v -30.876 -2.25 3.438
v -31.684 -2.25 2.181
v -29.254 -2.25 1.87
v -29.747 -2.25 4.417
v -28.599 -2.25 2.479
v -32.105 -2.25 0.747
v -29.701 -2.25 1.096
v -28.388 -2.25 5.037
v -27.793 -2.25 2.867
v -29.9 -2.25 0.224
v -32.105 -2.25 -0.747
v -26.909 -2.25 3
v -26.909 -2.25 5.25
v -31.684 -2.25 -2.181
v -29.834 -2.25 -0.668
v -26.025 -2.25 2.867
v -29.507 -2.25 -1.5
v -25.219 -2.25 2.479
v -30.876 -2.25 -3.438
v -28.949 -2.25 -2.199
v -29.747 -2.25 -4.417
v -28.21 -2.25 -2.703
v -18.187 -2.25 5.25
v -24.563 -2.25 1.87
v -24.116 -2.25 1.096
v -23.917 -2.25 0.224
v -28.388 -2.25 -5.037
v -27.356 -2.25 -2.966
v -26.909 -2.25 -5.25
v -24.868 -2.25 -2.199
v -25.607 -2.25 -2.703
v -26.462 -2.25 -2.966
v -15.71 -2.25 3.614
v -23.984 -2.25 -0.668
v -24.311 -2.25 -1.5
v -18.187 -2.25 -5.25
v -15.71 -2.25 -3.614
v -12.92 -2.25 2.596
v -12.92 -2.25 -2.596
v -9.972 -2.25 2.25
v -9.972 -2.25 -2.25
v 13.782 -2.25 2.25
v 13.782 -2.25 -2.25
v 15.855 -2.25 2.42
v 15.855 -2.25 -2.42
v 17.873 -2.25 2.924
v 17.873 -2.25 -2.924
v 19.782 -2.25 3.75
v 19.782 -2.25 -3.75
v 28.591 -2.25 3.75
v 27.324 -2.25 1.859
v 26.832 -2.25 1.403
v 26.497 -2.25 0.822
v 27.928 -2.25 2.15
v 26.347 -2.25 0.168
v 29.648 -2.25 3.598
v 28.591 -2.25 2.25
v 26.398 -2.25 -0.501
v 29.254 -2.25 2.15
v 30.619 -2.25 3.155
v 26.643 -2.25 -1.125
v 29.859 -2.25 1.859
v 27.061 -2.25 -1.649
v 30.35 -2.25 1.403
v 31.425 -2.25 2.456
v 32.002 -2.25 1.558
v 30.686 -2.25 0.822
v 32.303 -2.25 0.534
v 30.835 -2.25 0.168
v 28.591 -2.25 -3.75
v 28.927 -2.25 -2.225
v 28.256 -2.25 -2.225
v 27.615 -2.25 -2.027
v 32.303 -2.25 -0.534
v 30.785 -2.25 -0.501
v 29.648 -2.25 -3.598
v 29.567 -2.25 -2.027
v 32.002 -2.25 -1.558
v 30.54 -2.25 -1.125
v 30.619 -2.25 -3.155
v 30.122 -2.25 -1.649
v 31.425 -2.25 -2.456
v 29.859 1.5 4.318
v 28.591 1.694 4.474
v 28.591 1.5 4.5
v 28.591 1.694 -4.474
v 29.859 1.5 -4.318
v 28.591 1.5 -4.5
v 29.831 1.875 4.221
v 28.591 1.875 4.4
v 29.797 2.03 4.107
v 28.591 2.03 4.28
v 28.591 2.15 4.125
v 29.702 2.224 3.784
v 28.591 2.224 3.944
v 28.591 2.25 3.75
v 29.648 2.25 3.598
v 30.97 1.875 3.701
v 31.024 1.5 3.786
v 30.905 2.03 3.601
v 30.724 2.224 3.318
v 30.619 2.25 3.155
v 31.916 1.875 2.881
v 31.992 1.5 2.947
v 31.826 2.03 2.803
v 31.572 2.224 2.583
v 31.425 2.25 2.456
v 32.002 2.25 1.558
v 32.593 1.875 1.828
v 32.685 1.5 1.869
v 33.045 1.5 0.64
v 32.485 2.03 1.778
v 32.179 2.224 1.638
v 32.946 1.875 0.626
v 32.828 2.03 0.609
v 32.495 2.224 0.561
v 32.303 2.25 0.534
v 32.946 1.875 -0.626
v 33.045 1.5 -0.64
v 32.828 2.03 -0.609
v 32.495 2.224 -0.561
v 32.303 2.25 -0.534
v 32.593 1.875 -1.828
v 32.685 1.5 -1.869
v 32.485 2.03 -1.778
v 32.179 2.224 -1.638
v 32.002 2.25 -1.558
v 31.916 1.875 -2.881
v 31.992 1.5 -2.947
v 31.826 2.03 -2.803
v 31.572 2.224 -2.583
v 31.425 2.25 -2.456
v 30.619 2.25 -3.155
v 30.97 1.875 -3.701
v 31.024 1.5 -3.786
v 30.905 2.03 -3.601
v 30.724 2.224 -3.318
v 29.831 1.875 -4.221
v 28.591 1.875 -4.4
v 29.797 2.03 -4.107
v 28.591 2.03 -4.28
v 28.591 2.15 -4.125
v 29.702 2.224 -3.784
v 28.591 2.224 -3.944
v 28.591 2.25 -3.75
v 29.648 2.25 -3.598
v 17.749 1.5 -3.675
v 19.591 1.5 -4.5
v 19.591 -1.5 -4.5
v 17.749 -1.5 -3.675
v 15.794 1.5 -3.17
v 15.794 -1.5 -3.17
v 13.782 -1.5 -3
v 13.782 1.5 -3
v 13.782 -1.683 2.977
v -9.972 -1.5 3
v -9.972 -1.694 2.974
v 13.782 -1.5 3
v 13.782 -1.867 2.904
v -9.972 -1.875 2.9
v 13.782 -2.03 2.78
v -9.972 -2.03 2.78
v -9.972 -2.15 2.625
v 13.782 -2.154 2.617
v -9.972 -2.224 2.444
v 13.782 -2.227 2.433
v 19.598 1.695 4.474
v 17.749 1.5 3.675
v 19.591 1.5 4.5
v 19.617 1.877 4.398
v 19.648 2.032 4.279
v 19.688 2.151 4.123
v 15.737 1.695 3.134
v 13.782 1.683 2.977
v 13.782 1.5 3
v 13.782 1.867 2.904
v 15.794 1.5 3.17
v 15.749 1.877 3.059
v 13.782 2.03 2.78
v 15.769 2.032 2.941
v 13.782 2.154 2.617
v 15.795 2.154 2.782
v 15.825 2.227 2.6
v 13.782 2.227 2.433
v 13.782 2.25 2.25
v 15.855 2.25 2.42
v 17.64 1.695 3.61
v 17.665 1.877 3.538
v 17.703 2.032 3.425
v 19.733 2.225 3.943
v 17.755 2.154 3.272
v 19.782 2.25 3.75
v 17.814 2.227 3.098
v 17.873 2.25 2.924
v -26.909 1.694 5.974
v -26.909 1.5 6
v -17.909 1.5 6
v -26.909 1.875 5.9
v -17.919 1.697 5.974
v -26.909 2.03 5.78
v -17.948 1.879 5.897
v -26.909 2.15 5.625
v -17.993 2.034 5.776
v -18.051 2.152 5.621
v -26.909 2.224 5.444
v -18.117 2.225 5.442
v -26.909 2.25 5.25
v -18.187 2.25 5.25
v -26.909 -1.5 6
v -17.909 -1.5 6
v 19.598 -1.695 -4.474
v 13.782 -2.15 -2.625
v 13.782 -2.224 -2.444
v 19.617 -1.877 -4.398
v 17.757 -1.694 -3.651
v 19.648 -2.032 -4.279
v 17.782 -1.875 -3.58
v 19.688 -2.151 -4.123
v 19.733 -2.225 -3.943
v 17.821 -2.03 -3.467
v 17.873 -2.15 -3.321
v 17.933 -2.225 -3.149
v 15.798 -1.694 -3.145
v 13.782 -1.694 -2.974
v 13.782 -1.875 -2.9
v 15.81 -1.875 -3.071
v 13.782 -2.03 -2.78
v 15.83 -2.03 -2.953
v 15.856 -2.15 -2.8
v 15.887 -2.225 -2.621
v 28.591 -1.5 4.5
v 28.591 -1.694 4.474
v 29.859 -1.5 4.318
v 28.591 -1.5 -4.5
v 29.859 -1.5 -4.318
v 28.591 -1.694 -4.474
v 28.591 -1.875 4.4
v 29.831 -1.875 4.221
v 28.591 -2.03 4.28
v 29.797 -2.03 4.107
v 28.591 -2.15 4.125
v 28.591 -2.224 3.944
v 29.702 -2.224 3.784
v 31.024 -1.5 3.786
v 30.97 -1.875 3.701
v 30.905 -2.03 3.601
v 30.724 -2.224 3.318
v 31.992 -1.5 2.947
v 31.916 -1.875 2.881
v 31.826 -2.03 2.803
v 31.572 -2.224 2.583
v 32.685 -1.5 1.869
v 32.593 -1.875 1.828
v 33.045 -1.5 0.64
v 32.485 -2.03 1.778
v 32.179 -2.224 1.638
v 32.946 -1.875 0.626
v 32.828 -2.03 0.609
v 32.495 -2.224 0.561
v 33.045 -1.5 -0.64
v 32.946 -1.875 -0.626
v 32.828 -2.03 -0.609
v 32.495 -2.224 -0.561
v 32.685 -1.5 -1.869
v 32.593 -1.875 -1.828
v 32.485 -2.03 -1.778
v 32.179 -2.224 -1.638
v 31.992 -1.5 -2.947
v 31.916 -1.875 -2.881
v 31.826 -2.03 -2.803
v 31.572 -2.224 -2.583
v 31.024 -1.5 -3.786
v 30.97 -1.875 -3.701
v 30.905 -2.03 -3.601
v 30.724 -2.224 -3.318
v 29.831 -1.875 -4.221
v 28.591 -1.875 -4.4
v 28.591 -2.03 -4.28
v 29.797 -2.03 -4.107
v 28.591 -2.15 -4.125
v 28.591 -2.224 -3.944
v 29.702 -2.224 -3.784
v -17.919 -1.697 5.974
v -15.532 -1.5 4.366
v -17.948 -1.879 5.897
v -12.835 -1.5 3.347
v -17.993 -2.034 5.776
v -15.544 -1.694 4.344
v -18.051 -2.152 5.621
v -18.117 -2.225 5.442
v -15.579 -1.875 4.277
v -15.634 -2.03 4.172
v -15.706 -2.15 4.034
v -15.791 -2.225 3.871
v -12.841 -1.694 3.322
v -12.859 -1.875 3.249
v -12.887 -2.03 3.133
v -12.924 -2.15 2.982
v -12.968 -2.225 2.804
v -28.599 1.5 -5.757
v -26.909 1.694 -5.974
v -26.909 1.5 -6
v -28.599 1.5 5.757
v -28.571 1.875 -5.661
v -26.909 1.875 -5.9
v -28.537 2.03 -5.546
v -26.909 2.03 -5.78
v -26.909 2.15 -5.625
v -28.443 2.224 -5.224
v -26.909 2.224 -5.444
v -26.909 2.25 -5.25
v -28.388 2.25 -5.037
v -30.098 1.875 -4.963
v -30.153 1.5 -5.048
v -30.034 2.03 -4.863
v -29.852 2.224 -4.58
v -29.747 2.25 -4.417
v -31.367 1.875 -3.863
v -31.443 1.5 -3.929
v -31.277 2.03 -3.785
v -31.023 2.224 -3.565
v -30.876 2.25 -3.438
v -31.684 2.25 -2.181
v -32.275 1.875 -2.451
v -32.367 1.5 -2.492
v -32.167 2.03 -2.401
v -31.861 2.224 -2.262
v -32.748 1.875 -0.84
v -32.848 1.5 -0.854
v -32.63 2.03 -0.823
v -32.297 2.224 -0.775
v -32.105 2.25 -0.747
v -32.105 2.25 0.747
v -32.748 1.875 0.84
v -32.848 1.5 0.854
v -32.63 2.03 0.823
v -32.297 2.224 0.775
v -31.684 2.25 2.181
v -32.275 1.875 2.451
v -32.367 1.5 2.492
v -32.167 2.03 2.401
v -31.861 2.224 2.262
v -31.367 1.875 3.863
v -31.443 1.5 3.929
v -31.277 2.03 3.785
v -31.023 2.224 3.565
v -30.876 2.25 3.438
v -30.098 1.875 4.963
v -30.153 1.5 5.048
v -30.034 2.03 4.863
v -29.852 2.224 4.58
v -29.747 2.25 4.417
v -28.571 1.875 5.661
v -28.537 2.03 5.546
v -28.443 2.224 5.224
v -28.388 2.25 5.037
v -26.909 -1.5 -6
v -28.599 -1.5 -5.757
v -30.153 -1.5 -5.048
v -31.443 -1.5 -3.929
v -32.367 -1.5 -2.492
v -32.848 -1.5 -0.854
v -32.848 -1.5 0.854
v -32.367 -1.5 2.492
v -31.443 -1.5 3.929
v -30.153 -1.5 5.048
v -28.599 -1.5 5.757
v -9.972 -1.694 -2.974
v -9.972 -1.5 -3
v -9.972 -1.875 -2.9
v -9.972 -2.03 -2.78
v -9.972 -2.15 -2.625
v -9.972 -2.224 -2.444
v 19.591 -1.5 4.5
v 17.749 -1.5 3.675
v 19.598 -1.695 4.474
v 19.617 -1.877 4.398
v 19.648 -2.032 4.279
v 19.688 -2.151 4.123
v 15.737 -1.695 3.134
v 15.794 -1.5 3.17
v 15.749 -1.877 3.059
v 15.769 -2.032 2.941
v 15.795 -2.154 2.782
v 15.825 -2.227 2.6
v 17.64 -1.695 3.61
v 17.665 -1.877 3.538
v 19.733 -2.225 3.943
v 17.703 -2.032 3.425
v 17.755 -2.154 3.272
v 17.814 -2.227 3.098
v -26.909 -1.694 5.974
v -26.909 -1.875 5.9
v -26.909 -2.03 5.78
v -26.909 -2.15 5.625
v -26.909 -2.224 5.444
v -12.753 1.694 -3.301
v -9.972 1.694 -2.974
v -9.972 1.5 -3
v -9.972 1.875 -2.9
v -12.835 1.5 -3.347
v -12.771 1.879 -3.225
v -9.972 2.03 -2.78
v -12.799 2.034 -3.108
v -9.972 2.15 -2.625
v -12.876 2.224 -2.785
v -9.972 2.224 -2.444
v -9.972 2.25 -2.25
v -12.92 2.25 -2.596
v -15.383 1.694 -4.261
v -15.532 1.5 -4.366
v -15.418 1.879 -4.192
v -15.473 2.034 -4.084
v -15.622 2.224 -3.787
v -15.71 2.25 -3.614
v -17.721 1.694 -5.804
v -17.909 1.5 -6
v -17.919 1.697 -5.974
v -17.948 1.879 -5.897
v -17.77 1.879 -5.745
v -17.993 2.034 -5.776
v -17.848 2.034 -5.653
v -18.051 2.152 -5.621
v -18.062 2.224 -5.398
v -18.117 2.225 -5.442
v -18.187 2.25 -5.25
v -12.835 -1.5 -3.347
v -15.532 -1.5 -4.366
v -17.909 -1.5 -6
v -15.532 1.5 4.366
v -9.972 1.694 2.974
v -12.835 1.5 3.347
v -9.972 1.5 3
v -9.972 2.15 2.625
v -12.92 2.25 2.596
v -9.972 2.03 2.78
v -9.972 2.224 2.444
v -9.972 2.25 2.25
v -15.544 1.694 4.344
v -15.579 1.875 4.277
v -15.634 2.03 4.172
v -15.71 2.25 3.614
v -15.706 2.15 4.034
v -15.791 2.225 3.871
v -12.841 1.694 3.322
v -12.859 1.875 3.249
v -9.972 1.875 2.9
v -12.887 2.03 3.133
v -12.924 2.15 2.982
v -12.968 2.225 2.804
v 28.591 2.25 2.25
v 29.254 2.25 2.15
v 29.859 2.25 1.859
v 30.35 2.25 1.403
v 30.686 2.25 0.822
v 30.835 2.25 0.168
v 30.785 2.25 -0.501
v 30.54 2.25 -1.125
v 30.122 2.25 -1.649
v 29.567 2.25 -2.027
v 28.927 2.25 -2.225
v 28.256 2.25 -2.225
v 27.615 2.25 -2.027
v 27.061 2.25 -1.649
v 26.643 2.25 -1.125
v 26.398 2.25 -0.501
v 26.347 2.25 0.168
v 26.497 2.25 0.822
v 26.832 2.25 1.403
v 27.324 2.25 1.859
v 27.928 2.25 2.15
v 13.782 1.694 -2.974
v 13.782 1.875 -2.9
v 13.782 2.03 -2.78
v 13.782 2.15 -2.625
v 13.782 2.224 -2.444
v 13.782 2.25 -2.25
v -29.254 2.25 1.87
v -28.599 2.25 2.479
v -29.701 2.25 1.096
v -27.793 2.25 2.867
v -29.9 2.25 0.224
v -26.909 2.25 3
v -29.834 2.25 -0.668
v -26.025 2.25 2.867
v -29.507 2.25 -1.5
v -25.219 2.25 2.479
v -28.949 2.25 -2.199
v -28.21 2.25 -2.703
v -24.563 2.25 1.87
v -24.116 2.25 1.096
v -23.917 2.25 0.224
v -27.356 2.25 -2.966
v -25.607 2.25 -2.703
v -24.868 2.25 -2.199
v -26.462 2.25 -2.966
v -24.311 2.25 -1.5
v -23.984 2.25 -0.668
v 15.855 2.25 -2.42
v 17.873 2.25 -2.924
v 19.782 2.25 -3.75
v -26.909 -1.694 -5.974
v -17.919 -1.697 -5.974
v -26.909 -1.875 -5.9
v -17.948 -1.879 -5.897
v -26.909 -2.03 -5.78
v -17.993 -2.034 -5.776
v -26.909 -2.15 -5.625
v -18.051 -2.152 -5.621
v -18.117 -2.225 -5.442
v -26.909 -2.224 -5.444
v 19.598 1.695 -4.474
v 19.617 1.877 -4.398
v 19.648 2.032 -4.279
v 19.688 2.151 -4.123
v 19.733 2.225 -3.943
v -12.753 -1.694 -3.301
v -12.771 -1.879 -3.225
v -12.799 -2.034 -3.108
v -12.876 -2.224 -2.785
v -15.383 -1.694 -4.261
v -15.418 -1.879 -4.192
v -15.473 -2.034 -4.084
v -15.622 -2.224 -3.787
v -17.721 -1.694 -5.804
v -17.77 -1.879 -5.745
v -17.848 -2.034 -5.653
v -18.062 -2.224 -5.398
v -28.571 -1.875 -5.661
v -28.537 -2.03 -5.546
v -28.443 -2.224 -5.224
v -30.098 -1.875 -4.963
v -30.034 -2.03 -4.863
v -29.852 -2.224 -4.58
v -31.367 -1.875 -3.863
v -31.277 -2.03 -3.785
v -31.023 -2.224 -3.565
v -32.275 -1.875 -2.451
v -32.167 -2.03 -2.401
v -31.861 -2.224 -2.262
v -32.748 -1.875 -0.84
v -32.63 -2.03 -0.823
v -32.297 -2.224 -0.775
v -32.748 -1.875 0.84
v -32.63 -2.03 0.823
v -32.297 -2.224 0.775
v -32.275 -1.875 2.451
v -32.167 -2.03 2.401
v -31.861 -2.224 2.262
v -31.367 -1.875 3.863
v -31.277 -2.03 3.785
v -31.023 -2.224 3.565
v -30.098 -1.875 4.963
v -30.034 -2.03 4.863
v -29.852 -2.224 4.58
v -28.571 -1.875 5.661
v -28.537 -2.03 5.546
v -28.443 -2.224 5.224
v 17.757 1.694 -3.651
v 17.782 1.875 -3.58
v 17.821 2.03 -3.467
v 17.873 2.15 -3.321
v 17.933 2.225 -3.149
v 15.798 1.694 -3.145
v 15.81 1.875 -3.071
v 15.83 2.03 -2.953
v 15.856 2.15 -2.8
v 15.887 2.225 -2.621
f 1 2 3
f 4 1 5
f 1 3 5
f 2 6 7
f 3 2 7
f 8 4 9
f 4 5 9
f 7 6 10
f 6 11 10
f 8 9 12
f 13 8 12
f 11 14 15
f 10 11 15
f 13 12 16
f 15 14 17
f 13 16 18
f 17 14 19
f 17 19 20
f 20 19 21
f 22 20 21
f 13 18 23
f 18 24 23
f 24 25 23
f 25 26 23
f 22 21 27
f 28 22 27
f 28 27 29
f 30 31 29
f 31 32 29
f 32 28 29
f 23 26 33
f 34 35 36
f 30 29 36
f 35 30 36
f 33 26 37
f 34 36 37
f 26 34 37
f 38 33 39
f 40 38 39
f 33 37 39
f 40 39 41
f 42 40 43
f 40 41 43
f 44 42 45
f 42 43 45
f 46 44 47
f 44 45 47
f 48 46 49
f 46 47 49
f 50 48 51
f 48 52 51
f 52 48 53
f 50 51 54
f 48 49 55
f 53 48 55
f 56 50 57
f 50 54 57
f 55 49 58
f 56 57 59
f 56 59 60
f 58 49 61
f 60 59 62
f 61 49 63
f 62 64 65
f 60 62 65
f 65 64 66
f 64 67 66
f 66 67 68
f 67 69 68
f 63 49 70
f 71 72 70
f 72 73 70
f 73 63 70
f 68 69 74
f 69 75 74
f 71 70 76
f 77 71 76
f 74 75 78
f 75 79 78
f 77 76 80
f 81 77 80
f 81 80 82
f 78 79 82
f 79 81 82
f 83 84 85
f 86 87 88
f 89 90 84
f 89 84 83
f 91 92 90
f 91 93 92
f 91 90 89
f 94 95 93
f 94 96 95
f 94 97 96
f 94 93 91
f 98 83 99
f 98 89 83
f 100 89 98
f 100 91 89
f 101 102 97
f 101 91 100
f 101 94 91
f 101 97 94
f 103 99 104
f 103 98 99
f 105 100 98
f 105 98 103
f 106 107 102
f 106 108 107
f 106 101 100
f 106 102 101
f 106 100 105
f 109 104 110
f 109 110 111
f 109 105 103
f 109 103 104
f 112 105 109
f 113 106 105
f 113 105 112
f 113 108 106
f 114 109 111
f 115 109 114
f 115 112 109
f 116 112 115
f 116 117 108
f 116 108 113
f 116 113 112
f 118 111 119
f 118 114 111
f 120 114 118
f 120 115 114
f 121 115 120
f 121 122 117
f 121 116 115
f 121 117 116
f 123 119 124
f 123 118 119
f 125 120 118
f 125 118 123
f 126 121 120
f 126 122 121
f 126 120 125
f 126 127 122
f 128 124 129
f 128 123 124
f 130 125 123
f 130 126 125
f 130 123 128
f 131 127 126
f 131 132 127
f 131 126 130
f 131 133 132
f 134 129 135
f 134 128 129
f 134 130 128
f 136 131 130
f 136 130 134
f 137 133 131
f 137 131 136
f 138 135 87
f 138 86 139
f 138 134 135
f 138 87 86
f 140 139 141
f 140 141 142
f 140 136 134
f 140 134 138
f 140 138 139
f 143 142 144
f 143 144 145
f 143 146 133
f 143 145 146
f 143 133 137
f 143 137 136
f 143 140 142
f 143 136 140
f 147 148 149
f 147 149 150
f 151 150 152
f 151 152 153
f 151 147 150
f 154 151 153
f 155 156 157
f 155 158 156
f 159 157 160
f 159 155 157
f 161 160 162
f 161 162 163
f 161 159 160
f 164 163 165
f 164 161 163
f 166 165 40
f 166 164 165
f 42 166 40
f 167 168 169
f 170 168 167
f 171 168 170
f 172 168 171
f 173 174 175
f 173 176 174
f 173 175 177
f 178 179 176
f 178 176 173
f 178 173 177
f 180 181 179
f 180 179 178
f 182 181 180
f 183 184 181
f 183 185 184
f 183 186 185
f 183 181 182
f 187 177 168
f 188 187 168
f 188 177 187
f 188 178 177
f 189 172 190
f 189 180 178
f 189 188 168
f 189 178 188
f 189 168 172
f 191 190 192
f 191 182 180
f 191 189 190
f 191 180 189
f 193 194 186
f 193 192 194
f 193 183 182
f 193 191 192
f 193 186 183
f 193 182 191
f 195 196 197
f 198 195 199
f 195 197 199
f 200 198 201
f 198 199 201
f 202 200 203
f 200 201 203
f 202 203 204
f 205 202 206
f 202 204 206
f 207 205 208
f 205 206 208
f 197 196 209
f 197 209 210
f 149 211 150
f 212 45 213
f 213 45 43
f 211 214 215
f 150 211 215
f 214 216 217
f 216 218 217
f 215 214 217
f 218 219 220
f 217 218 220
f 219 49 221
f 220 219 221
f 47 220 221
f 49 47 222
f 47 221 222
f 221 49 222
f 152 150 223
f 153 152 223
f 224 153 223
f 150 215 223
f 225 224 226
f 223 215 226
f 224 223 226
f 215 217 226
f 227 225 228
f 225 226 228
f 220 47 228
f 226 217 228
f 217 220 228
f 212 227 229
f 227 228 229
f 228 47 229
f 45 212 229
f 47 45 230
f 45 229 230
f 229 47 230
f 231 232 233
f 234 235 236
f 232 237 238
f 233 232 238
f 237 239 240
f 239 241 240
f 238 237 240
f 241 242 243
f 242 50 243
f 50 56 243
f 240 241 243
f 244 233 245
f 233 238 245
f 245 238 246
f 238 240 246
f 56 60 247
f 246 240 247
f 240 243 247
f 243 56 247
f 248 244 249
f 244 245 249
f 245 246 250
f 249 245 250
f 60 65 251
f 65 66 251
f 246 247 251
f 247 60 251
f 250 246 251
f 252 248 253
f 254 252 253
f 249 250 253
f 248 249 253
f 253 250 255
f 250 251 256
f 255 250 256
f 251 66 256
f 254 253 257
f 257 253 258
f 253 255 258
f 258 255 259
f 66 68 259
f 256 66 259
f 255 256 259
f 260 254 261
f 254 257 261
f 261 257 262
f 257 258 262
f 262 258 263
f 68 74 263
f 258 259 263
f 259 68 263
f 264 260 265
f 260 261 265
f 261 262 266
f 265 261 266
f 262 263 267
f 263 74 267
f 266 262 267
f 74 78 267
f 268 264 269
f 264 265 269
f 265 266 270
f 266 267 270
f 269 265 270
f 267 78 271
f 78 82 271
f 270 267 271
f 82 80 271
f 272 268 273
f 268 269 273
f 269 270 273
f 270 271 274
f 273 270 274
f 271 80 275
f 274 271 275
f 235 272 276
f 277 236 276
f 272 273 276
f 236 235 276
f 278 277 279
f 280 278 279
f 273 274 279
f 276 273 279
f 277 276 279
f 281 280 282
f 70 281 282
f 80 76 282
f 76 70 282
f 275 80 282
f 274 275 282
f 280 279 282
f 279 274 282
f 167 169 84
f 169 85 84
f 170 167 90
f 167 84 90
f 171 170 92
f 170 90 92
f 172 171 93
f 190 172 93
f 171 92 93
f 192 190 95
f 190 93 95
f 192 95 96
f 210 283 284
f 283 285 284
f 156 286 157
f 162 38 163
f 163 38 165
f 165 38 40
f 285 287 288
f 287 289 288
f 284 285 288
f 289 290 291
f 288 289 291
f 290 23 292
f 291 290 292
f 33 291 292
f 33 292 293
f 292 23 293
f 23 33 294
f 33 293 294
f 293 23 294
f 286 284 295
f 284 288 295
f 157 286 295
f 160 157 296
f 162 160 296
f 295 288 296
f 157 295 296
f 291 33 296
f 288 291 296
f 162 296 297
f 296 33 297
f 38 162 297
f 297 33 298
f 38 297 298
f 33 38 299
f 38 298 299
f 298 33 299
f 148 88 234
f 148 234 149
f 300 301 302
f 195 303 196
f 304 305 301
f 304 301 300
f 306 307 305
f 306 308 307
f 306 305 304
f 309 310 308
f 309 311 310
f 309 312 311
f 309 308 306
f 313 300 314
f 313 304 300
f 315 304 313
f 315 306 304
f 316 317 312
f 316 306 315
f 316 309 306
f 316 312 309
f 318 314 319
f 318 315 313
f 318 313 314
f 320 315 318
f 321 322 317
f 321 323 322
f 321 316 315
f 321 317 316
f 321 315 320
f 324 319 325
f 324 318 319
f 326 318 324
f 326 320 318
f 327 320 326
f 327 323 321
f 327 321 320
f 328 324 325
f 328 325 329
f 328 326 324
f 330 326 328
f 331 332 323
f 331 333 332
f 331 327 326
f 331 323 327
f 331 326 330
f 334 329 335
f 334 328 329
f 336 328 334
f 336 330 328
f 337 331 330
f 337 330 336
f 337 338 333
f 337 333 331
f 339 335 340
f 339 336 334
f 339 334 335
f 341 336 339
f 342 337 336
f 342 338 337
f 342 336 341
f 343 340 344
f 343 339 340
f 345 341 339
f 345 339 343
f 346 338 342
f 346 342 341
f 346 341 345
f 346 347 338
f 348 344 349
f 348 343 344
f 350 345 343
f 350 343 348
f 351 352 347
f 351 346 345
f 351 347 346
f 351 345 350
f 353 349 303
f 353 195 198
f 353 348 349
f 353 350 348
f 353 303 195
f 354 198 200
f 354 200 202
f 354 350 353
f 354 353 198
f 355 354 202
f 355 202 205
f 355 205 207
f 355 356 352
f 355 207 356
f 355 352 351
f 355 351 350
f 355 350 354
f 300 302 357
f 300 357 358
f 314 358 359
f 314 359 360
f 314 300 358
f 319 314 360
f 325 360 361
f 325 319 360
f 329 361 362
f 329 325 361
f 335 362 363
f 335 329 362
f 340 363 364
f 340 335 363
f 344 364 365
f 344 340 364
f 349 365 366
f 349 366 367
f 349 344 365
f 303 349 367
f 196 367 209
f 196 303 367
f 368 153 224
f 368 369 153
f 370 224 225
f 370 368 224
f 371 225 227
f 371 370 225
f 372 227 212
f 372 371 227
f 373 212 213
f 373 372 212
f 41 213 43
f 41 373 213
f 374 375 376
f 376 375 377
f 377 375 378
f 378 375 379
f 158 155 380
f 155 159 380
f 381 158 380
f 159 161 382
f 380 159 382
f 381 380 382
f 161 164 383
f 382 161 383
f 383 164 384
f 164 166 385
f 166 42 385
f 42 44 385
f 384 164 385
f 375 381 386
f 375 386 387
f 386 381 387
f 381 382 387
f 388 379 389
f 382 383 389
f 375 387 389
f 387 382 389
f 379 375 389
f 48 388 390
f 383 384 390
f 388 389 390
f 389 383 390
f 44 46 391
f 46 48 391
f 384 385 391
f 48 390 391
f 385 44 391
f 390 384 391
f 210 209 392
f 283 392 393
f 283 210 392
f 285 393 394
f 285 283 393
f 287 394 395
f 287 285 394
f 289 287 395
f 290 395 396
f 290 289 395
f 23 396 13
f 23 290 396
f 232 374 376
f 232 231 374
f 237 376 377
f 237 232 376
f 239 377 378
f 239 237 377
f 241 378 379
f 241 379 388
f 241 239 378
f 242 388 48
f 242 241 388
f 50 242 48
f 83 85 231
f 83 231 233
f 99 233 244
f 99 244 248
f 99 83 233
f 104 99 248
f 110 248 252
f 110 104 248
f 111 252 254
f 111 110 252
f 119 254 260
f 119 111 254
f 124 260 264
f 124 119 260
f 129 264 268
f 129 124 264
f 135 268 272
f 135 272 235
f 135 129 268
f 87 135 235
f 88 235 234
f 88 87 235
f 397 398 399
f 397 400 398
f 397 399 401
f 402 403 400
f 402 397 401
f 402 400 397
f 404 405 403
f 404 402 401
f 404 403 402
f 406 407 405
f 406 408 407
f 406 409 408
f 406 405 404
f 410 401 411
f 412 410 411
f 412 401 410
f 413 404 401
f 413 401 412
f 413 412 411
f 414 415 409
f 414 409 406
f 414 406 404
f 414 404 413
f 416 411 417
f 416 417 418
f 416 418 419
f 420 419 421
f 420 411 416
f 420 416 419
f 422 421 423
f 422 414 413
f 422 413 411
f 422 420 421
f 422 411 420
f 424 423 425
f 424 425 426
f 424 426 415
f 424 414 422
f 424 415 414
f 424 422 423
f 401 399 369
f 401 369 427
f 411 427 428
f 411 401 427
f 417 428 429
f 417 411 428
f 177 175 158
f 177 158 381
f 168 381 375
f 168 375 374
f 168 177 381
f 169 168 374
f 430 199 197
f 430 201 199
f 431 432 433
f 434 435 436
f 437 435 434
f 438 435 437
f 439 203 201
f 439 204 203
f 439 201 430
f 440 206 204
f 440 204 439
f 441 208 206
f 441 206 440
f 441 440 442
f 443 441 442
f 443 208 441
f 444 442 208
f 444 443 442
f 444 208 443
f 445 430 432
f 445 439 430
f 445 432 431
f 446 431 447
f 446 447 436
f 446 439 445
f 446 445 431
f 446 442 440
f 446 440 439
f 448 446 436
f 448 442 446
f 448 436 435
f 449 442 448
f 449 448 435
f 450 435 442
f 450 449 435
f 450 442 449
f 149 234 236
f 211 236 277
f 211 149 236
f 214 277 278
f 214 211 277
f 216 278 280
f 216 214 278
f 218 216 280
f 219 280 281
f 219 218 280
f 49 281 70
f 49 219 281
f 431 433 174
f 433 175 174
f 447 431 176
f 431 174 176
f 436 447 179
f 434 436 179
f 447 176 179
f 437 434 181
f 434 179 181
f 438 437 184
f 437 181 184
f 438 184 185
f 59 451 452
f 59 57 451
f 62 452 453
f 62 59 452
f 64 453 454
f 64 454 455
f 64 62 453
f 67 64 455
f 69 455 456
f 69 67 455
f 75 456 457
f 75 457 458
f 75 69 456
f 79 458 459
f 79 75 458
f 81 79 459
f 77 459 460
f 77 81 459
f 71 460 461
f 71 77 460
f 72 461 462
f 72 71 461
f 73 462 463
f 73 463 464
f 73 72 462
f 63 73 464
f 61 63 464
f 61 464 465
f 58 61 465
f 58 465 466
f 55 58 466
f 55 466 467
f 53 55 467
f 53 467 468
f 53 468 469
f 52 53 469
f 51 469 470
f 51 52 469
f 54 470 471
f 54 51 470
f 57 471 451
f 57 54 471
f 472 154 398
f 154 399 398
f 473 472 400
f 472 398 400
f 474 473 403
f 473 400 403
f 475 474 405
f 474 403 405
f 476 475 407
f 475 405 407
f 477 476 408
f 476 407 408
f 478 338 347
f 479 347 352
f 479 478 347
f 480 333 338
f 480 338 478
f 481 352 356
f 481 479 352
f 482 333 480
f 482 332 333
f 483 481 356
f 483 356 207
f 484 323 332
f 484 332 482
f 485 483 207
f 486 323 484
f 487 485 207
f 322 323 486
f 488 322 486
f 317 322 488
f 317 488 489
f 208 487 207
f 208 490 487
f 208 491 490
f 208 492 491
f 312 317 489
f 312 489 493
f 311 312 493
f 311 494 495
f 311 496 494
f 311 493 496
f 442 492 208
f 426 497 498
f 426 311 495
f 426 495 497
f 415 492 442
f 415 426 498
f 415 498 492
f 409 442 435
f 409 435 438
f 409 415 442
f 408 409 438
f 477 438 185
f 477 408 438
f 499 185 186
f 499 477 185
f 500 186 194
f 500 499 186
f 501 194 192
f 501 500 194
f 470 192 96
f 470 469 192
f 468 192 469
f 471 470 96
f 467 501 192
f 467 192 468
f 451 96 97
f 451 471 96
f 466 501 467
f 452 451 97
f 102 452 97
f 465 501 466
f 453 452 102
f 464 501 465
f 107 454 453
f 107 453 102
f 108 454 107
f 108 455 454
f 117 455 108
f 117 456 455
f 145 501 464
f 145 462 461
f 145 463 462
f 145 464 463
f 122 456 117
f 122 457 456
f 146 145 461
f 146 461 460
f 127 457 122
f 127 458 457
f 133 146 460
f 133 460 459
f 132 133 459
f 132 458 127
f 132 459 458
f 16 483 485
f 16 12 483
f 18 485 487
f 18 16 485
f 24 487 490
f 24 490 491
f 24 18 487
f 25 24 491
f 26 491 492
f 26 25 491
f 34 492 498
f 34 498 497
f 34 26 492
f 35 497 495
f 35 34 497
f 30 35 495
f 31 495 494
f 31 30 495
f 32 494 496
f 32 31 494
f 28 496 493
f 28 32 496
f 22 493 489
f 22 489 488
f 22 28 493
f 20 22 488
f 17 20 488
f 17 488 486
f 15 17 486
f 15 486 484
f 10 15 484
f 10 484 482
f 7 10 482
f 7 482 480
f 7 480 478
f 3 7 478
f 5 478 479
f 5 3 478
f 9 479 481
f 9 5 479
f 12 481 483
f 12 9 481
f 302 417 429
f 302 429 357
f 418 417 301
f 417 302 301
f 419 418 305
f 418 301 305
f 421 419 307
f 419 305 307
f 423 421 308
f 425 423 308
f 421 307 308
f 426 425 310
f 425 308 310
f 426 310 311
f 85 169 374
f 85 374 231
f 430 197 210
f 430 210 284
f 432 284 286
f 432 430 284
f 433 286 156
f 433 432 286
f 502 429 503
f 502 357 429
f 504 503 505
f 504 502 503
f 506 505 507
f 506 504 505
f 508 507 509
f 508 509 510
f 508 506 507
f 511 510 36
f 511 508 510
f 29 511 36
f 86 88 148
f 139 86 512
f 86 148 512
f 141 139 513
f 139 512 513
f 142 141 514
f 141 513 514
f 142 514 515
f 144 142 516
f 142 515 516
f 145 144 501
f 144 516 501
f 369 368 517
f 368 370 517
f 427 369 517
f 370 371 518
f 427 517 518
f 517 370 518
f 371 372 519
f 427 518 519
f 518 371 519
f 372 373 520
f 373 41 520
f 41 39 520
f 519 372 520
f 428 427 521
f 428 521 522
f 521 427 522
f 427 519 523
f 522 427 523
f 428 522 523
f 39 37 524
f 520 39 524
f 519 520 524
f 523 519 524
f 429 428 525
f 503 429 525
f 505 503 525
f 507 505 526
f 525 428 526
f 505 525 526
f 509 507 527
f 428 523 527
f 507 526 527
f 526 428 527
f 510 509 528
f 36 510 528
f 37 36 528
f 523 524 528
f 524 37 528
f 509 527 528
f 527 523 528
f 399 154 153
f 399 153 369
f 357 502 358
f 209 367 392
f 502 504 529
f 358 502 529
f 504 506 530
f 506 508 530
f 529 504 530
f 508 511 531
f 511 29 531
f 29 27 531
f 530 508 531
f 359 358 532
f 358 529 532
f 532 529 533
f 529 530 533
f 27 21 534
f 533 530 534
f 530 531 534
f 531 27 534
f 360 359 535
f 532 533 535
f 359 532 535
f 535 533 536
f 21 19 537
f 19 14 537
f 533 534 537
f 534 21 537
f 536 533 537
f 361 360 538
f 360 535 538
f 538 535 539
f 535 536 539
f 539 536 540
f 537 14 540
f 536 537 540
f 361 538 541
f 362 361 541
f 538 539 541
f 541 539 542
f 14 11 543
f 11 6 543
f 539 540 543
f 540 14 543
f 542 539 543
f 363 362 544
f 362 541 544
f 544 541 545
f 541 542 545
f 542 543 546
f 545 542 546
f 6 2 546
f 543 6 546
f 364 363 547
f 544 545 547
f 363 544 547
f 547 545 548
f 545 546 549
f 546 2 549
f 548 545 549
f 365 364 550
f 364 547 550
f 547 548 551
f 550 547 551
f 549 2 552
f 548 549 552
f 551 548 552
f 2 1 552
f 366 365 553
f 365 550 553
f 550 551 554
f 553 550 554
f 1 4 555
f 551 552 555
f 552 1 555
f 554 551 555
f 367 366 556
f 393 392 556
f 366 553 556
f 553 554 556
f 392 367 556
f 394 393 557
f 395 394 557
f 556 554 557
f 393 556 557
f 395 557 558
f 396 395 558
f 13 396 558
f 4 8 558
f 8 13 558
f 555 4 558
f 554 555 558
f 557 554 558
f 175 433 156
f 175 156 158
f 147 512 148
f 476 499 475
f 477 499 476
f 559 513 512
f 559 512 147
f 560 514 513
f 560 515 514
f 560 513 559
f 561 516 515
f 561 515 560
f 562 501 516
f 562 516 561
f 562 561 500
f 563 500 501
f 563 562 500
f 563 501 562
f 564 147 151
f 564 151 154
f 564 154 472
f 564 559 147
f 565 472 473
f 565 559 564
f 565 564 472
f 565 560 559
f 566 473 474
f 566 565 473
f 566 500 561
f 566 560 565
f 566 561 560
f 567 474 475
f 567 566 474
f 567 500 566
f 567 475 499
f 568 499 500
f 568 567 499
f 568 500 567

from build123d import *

# Parameters (mm, degrees)
SKETCH1_R           = 2
SKETCH1_R_2         = 1.5
BOSS_EXTRUDE1_DEPTH = 1.5
SCALE1_SCALE        = 1.5
FILLET1_R           = 0.75


with BuildPart() as part:
    # Sketch1 → Boss-Extrude1 (new, symmetric)
    with BuildSketch(Plane(origin=(0, 0, 0), x_dir=(1, 0, 0), z_dir=(0, 1, 0))):
        with BuildLine():
            ThreePointArc((-18.5, 4), (-22.5, 0), (-18.5, -4))
            Line((-18.5, -4), (-12.5, -4))
            ThreePointArc((-12.5, -4), (-10.036924503, -2.516685226), (-7.208497378, -2))
            Line((-7.208497378, -2), (8.627016654, -2))
            ThreePointArc((8.627016654, -2), (10.627016654, -2.254033308), (12.5, -3))
            Line((12.5, -3), (18.5, -3))
            ThreePointArc((18.5, -3), (21.5, 0), (18.5, 3))
            Line((18.5, 3), (12.5, 3))
            ThreePointArc((12.5, 3), (10.627016654, 2.254033308), (8.627016654, 2))
            Line((8.627016654, 2), (-7.208497378, 2))
            ThreePointArc((-7.208497378, 2), (-10.036924503, 2.516685226), (-12.5, 4))
            Line((-12.5, 4), (-18.5, 4))
        make_face()
        with Locations(Location((-18.5, 0, 0), (0, 0, 270))):
            Circle(SKETCH1_R, mode=Mode.SUBTRACT)
        with Locations(Location((18.5, 0, 0), (0, 0, 270))):
            Circle(SKETCH1_R_2, mode=Mode.SUBTRACT)
    extrude(amount=BOSS_EXTRUDE1_DEPTH, both=True)


with BuildPart() as part_1:
    # Scale1: scaled about (-1.682409561, 0, 0)
    add(part.part.scale(SCALE1_SCALE).moved(Location((0.841204781, 0, 0))))

    # Fillet1
    fillet1_edges = [part_1.edges().sort_by_distance(p)[0] for p in [
        (33.09120478, 2.25, 0),
        (24.091204781, 2.25, -4.5),
        (16.781729761, -2.25, 3.381049961),
        (1.905094237, -2.25, 3),
        (-14.214181973, -2.25, 3.77502784),
        (-22.408795219, -2.25, 6),
        (-32.908795219, -2.25, 0),
        (-22.408795219, -2.25, -6),
        (-14.214181973, -2.25, -3.77502784),
        (1.905094237, -2.25, -3),
        (16.781729761, -2.25, -3.381049961),
        (24.091204781, -2.25, -4.5),
        (16.781729761, 2.25, -3.381049961),
        (33.09120478, -2.25, 0),
        (24.091204781, -2.25, 4.5),
        (1.905094237, 2.25, -3),
        (-14.214181973, 2.25, -3.77502784),
        (-22.408795219, 2.25, -6),
        (-32.908795219, 2.25, 0),
        (-22.408795219, 2.25, 6),
        (-14.214181973, 2.25, 3.77502784),
        (1.905094237, 2.25, 3),
        (16.781729761, 2.25, 3.381049961),
        (24.091204781, 2.25, 4.5),
    ]]
    fillet(fillet1_edges, radius=FILLET1_R)


solid = part_1.part
